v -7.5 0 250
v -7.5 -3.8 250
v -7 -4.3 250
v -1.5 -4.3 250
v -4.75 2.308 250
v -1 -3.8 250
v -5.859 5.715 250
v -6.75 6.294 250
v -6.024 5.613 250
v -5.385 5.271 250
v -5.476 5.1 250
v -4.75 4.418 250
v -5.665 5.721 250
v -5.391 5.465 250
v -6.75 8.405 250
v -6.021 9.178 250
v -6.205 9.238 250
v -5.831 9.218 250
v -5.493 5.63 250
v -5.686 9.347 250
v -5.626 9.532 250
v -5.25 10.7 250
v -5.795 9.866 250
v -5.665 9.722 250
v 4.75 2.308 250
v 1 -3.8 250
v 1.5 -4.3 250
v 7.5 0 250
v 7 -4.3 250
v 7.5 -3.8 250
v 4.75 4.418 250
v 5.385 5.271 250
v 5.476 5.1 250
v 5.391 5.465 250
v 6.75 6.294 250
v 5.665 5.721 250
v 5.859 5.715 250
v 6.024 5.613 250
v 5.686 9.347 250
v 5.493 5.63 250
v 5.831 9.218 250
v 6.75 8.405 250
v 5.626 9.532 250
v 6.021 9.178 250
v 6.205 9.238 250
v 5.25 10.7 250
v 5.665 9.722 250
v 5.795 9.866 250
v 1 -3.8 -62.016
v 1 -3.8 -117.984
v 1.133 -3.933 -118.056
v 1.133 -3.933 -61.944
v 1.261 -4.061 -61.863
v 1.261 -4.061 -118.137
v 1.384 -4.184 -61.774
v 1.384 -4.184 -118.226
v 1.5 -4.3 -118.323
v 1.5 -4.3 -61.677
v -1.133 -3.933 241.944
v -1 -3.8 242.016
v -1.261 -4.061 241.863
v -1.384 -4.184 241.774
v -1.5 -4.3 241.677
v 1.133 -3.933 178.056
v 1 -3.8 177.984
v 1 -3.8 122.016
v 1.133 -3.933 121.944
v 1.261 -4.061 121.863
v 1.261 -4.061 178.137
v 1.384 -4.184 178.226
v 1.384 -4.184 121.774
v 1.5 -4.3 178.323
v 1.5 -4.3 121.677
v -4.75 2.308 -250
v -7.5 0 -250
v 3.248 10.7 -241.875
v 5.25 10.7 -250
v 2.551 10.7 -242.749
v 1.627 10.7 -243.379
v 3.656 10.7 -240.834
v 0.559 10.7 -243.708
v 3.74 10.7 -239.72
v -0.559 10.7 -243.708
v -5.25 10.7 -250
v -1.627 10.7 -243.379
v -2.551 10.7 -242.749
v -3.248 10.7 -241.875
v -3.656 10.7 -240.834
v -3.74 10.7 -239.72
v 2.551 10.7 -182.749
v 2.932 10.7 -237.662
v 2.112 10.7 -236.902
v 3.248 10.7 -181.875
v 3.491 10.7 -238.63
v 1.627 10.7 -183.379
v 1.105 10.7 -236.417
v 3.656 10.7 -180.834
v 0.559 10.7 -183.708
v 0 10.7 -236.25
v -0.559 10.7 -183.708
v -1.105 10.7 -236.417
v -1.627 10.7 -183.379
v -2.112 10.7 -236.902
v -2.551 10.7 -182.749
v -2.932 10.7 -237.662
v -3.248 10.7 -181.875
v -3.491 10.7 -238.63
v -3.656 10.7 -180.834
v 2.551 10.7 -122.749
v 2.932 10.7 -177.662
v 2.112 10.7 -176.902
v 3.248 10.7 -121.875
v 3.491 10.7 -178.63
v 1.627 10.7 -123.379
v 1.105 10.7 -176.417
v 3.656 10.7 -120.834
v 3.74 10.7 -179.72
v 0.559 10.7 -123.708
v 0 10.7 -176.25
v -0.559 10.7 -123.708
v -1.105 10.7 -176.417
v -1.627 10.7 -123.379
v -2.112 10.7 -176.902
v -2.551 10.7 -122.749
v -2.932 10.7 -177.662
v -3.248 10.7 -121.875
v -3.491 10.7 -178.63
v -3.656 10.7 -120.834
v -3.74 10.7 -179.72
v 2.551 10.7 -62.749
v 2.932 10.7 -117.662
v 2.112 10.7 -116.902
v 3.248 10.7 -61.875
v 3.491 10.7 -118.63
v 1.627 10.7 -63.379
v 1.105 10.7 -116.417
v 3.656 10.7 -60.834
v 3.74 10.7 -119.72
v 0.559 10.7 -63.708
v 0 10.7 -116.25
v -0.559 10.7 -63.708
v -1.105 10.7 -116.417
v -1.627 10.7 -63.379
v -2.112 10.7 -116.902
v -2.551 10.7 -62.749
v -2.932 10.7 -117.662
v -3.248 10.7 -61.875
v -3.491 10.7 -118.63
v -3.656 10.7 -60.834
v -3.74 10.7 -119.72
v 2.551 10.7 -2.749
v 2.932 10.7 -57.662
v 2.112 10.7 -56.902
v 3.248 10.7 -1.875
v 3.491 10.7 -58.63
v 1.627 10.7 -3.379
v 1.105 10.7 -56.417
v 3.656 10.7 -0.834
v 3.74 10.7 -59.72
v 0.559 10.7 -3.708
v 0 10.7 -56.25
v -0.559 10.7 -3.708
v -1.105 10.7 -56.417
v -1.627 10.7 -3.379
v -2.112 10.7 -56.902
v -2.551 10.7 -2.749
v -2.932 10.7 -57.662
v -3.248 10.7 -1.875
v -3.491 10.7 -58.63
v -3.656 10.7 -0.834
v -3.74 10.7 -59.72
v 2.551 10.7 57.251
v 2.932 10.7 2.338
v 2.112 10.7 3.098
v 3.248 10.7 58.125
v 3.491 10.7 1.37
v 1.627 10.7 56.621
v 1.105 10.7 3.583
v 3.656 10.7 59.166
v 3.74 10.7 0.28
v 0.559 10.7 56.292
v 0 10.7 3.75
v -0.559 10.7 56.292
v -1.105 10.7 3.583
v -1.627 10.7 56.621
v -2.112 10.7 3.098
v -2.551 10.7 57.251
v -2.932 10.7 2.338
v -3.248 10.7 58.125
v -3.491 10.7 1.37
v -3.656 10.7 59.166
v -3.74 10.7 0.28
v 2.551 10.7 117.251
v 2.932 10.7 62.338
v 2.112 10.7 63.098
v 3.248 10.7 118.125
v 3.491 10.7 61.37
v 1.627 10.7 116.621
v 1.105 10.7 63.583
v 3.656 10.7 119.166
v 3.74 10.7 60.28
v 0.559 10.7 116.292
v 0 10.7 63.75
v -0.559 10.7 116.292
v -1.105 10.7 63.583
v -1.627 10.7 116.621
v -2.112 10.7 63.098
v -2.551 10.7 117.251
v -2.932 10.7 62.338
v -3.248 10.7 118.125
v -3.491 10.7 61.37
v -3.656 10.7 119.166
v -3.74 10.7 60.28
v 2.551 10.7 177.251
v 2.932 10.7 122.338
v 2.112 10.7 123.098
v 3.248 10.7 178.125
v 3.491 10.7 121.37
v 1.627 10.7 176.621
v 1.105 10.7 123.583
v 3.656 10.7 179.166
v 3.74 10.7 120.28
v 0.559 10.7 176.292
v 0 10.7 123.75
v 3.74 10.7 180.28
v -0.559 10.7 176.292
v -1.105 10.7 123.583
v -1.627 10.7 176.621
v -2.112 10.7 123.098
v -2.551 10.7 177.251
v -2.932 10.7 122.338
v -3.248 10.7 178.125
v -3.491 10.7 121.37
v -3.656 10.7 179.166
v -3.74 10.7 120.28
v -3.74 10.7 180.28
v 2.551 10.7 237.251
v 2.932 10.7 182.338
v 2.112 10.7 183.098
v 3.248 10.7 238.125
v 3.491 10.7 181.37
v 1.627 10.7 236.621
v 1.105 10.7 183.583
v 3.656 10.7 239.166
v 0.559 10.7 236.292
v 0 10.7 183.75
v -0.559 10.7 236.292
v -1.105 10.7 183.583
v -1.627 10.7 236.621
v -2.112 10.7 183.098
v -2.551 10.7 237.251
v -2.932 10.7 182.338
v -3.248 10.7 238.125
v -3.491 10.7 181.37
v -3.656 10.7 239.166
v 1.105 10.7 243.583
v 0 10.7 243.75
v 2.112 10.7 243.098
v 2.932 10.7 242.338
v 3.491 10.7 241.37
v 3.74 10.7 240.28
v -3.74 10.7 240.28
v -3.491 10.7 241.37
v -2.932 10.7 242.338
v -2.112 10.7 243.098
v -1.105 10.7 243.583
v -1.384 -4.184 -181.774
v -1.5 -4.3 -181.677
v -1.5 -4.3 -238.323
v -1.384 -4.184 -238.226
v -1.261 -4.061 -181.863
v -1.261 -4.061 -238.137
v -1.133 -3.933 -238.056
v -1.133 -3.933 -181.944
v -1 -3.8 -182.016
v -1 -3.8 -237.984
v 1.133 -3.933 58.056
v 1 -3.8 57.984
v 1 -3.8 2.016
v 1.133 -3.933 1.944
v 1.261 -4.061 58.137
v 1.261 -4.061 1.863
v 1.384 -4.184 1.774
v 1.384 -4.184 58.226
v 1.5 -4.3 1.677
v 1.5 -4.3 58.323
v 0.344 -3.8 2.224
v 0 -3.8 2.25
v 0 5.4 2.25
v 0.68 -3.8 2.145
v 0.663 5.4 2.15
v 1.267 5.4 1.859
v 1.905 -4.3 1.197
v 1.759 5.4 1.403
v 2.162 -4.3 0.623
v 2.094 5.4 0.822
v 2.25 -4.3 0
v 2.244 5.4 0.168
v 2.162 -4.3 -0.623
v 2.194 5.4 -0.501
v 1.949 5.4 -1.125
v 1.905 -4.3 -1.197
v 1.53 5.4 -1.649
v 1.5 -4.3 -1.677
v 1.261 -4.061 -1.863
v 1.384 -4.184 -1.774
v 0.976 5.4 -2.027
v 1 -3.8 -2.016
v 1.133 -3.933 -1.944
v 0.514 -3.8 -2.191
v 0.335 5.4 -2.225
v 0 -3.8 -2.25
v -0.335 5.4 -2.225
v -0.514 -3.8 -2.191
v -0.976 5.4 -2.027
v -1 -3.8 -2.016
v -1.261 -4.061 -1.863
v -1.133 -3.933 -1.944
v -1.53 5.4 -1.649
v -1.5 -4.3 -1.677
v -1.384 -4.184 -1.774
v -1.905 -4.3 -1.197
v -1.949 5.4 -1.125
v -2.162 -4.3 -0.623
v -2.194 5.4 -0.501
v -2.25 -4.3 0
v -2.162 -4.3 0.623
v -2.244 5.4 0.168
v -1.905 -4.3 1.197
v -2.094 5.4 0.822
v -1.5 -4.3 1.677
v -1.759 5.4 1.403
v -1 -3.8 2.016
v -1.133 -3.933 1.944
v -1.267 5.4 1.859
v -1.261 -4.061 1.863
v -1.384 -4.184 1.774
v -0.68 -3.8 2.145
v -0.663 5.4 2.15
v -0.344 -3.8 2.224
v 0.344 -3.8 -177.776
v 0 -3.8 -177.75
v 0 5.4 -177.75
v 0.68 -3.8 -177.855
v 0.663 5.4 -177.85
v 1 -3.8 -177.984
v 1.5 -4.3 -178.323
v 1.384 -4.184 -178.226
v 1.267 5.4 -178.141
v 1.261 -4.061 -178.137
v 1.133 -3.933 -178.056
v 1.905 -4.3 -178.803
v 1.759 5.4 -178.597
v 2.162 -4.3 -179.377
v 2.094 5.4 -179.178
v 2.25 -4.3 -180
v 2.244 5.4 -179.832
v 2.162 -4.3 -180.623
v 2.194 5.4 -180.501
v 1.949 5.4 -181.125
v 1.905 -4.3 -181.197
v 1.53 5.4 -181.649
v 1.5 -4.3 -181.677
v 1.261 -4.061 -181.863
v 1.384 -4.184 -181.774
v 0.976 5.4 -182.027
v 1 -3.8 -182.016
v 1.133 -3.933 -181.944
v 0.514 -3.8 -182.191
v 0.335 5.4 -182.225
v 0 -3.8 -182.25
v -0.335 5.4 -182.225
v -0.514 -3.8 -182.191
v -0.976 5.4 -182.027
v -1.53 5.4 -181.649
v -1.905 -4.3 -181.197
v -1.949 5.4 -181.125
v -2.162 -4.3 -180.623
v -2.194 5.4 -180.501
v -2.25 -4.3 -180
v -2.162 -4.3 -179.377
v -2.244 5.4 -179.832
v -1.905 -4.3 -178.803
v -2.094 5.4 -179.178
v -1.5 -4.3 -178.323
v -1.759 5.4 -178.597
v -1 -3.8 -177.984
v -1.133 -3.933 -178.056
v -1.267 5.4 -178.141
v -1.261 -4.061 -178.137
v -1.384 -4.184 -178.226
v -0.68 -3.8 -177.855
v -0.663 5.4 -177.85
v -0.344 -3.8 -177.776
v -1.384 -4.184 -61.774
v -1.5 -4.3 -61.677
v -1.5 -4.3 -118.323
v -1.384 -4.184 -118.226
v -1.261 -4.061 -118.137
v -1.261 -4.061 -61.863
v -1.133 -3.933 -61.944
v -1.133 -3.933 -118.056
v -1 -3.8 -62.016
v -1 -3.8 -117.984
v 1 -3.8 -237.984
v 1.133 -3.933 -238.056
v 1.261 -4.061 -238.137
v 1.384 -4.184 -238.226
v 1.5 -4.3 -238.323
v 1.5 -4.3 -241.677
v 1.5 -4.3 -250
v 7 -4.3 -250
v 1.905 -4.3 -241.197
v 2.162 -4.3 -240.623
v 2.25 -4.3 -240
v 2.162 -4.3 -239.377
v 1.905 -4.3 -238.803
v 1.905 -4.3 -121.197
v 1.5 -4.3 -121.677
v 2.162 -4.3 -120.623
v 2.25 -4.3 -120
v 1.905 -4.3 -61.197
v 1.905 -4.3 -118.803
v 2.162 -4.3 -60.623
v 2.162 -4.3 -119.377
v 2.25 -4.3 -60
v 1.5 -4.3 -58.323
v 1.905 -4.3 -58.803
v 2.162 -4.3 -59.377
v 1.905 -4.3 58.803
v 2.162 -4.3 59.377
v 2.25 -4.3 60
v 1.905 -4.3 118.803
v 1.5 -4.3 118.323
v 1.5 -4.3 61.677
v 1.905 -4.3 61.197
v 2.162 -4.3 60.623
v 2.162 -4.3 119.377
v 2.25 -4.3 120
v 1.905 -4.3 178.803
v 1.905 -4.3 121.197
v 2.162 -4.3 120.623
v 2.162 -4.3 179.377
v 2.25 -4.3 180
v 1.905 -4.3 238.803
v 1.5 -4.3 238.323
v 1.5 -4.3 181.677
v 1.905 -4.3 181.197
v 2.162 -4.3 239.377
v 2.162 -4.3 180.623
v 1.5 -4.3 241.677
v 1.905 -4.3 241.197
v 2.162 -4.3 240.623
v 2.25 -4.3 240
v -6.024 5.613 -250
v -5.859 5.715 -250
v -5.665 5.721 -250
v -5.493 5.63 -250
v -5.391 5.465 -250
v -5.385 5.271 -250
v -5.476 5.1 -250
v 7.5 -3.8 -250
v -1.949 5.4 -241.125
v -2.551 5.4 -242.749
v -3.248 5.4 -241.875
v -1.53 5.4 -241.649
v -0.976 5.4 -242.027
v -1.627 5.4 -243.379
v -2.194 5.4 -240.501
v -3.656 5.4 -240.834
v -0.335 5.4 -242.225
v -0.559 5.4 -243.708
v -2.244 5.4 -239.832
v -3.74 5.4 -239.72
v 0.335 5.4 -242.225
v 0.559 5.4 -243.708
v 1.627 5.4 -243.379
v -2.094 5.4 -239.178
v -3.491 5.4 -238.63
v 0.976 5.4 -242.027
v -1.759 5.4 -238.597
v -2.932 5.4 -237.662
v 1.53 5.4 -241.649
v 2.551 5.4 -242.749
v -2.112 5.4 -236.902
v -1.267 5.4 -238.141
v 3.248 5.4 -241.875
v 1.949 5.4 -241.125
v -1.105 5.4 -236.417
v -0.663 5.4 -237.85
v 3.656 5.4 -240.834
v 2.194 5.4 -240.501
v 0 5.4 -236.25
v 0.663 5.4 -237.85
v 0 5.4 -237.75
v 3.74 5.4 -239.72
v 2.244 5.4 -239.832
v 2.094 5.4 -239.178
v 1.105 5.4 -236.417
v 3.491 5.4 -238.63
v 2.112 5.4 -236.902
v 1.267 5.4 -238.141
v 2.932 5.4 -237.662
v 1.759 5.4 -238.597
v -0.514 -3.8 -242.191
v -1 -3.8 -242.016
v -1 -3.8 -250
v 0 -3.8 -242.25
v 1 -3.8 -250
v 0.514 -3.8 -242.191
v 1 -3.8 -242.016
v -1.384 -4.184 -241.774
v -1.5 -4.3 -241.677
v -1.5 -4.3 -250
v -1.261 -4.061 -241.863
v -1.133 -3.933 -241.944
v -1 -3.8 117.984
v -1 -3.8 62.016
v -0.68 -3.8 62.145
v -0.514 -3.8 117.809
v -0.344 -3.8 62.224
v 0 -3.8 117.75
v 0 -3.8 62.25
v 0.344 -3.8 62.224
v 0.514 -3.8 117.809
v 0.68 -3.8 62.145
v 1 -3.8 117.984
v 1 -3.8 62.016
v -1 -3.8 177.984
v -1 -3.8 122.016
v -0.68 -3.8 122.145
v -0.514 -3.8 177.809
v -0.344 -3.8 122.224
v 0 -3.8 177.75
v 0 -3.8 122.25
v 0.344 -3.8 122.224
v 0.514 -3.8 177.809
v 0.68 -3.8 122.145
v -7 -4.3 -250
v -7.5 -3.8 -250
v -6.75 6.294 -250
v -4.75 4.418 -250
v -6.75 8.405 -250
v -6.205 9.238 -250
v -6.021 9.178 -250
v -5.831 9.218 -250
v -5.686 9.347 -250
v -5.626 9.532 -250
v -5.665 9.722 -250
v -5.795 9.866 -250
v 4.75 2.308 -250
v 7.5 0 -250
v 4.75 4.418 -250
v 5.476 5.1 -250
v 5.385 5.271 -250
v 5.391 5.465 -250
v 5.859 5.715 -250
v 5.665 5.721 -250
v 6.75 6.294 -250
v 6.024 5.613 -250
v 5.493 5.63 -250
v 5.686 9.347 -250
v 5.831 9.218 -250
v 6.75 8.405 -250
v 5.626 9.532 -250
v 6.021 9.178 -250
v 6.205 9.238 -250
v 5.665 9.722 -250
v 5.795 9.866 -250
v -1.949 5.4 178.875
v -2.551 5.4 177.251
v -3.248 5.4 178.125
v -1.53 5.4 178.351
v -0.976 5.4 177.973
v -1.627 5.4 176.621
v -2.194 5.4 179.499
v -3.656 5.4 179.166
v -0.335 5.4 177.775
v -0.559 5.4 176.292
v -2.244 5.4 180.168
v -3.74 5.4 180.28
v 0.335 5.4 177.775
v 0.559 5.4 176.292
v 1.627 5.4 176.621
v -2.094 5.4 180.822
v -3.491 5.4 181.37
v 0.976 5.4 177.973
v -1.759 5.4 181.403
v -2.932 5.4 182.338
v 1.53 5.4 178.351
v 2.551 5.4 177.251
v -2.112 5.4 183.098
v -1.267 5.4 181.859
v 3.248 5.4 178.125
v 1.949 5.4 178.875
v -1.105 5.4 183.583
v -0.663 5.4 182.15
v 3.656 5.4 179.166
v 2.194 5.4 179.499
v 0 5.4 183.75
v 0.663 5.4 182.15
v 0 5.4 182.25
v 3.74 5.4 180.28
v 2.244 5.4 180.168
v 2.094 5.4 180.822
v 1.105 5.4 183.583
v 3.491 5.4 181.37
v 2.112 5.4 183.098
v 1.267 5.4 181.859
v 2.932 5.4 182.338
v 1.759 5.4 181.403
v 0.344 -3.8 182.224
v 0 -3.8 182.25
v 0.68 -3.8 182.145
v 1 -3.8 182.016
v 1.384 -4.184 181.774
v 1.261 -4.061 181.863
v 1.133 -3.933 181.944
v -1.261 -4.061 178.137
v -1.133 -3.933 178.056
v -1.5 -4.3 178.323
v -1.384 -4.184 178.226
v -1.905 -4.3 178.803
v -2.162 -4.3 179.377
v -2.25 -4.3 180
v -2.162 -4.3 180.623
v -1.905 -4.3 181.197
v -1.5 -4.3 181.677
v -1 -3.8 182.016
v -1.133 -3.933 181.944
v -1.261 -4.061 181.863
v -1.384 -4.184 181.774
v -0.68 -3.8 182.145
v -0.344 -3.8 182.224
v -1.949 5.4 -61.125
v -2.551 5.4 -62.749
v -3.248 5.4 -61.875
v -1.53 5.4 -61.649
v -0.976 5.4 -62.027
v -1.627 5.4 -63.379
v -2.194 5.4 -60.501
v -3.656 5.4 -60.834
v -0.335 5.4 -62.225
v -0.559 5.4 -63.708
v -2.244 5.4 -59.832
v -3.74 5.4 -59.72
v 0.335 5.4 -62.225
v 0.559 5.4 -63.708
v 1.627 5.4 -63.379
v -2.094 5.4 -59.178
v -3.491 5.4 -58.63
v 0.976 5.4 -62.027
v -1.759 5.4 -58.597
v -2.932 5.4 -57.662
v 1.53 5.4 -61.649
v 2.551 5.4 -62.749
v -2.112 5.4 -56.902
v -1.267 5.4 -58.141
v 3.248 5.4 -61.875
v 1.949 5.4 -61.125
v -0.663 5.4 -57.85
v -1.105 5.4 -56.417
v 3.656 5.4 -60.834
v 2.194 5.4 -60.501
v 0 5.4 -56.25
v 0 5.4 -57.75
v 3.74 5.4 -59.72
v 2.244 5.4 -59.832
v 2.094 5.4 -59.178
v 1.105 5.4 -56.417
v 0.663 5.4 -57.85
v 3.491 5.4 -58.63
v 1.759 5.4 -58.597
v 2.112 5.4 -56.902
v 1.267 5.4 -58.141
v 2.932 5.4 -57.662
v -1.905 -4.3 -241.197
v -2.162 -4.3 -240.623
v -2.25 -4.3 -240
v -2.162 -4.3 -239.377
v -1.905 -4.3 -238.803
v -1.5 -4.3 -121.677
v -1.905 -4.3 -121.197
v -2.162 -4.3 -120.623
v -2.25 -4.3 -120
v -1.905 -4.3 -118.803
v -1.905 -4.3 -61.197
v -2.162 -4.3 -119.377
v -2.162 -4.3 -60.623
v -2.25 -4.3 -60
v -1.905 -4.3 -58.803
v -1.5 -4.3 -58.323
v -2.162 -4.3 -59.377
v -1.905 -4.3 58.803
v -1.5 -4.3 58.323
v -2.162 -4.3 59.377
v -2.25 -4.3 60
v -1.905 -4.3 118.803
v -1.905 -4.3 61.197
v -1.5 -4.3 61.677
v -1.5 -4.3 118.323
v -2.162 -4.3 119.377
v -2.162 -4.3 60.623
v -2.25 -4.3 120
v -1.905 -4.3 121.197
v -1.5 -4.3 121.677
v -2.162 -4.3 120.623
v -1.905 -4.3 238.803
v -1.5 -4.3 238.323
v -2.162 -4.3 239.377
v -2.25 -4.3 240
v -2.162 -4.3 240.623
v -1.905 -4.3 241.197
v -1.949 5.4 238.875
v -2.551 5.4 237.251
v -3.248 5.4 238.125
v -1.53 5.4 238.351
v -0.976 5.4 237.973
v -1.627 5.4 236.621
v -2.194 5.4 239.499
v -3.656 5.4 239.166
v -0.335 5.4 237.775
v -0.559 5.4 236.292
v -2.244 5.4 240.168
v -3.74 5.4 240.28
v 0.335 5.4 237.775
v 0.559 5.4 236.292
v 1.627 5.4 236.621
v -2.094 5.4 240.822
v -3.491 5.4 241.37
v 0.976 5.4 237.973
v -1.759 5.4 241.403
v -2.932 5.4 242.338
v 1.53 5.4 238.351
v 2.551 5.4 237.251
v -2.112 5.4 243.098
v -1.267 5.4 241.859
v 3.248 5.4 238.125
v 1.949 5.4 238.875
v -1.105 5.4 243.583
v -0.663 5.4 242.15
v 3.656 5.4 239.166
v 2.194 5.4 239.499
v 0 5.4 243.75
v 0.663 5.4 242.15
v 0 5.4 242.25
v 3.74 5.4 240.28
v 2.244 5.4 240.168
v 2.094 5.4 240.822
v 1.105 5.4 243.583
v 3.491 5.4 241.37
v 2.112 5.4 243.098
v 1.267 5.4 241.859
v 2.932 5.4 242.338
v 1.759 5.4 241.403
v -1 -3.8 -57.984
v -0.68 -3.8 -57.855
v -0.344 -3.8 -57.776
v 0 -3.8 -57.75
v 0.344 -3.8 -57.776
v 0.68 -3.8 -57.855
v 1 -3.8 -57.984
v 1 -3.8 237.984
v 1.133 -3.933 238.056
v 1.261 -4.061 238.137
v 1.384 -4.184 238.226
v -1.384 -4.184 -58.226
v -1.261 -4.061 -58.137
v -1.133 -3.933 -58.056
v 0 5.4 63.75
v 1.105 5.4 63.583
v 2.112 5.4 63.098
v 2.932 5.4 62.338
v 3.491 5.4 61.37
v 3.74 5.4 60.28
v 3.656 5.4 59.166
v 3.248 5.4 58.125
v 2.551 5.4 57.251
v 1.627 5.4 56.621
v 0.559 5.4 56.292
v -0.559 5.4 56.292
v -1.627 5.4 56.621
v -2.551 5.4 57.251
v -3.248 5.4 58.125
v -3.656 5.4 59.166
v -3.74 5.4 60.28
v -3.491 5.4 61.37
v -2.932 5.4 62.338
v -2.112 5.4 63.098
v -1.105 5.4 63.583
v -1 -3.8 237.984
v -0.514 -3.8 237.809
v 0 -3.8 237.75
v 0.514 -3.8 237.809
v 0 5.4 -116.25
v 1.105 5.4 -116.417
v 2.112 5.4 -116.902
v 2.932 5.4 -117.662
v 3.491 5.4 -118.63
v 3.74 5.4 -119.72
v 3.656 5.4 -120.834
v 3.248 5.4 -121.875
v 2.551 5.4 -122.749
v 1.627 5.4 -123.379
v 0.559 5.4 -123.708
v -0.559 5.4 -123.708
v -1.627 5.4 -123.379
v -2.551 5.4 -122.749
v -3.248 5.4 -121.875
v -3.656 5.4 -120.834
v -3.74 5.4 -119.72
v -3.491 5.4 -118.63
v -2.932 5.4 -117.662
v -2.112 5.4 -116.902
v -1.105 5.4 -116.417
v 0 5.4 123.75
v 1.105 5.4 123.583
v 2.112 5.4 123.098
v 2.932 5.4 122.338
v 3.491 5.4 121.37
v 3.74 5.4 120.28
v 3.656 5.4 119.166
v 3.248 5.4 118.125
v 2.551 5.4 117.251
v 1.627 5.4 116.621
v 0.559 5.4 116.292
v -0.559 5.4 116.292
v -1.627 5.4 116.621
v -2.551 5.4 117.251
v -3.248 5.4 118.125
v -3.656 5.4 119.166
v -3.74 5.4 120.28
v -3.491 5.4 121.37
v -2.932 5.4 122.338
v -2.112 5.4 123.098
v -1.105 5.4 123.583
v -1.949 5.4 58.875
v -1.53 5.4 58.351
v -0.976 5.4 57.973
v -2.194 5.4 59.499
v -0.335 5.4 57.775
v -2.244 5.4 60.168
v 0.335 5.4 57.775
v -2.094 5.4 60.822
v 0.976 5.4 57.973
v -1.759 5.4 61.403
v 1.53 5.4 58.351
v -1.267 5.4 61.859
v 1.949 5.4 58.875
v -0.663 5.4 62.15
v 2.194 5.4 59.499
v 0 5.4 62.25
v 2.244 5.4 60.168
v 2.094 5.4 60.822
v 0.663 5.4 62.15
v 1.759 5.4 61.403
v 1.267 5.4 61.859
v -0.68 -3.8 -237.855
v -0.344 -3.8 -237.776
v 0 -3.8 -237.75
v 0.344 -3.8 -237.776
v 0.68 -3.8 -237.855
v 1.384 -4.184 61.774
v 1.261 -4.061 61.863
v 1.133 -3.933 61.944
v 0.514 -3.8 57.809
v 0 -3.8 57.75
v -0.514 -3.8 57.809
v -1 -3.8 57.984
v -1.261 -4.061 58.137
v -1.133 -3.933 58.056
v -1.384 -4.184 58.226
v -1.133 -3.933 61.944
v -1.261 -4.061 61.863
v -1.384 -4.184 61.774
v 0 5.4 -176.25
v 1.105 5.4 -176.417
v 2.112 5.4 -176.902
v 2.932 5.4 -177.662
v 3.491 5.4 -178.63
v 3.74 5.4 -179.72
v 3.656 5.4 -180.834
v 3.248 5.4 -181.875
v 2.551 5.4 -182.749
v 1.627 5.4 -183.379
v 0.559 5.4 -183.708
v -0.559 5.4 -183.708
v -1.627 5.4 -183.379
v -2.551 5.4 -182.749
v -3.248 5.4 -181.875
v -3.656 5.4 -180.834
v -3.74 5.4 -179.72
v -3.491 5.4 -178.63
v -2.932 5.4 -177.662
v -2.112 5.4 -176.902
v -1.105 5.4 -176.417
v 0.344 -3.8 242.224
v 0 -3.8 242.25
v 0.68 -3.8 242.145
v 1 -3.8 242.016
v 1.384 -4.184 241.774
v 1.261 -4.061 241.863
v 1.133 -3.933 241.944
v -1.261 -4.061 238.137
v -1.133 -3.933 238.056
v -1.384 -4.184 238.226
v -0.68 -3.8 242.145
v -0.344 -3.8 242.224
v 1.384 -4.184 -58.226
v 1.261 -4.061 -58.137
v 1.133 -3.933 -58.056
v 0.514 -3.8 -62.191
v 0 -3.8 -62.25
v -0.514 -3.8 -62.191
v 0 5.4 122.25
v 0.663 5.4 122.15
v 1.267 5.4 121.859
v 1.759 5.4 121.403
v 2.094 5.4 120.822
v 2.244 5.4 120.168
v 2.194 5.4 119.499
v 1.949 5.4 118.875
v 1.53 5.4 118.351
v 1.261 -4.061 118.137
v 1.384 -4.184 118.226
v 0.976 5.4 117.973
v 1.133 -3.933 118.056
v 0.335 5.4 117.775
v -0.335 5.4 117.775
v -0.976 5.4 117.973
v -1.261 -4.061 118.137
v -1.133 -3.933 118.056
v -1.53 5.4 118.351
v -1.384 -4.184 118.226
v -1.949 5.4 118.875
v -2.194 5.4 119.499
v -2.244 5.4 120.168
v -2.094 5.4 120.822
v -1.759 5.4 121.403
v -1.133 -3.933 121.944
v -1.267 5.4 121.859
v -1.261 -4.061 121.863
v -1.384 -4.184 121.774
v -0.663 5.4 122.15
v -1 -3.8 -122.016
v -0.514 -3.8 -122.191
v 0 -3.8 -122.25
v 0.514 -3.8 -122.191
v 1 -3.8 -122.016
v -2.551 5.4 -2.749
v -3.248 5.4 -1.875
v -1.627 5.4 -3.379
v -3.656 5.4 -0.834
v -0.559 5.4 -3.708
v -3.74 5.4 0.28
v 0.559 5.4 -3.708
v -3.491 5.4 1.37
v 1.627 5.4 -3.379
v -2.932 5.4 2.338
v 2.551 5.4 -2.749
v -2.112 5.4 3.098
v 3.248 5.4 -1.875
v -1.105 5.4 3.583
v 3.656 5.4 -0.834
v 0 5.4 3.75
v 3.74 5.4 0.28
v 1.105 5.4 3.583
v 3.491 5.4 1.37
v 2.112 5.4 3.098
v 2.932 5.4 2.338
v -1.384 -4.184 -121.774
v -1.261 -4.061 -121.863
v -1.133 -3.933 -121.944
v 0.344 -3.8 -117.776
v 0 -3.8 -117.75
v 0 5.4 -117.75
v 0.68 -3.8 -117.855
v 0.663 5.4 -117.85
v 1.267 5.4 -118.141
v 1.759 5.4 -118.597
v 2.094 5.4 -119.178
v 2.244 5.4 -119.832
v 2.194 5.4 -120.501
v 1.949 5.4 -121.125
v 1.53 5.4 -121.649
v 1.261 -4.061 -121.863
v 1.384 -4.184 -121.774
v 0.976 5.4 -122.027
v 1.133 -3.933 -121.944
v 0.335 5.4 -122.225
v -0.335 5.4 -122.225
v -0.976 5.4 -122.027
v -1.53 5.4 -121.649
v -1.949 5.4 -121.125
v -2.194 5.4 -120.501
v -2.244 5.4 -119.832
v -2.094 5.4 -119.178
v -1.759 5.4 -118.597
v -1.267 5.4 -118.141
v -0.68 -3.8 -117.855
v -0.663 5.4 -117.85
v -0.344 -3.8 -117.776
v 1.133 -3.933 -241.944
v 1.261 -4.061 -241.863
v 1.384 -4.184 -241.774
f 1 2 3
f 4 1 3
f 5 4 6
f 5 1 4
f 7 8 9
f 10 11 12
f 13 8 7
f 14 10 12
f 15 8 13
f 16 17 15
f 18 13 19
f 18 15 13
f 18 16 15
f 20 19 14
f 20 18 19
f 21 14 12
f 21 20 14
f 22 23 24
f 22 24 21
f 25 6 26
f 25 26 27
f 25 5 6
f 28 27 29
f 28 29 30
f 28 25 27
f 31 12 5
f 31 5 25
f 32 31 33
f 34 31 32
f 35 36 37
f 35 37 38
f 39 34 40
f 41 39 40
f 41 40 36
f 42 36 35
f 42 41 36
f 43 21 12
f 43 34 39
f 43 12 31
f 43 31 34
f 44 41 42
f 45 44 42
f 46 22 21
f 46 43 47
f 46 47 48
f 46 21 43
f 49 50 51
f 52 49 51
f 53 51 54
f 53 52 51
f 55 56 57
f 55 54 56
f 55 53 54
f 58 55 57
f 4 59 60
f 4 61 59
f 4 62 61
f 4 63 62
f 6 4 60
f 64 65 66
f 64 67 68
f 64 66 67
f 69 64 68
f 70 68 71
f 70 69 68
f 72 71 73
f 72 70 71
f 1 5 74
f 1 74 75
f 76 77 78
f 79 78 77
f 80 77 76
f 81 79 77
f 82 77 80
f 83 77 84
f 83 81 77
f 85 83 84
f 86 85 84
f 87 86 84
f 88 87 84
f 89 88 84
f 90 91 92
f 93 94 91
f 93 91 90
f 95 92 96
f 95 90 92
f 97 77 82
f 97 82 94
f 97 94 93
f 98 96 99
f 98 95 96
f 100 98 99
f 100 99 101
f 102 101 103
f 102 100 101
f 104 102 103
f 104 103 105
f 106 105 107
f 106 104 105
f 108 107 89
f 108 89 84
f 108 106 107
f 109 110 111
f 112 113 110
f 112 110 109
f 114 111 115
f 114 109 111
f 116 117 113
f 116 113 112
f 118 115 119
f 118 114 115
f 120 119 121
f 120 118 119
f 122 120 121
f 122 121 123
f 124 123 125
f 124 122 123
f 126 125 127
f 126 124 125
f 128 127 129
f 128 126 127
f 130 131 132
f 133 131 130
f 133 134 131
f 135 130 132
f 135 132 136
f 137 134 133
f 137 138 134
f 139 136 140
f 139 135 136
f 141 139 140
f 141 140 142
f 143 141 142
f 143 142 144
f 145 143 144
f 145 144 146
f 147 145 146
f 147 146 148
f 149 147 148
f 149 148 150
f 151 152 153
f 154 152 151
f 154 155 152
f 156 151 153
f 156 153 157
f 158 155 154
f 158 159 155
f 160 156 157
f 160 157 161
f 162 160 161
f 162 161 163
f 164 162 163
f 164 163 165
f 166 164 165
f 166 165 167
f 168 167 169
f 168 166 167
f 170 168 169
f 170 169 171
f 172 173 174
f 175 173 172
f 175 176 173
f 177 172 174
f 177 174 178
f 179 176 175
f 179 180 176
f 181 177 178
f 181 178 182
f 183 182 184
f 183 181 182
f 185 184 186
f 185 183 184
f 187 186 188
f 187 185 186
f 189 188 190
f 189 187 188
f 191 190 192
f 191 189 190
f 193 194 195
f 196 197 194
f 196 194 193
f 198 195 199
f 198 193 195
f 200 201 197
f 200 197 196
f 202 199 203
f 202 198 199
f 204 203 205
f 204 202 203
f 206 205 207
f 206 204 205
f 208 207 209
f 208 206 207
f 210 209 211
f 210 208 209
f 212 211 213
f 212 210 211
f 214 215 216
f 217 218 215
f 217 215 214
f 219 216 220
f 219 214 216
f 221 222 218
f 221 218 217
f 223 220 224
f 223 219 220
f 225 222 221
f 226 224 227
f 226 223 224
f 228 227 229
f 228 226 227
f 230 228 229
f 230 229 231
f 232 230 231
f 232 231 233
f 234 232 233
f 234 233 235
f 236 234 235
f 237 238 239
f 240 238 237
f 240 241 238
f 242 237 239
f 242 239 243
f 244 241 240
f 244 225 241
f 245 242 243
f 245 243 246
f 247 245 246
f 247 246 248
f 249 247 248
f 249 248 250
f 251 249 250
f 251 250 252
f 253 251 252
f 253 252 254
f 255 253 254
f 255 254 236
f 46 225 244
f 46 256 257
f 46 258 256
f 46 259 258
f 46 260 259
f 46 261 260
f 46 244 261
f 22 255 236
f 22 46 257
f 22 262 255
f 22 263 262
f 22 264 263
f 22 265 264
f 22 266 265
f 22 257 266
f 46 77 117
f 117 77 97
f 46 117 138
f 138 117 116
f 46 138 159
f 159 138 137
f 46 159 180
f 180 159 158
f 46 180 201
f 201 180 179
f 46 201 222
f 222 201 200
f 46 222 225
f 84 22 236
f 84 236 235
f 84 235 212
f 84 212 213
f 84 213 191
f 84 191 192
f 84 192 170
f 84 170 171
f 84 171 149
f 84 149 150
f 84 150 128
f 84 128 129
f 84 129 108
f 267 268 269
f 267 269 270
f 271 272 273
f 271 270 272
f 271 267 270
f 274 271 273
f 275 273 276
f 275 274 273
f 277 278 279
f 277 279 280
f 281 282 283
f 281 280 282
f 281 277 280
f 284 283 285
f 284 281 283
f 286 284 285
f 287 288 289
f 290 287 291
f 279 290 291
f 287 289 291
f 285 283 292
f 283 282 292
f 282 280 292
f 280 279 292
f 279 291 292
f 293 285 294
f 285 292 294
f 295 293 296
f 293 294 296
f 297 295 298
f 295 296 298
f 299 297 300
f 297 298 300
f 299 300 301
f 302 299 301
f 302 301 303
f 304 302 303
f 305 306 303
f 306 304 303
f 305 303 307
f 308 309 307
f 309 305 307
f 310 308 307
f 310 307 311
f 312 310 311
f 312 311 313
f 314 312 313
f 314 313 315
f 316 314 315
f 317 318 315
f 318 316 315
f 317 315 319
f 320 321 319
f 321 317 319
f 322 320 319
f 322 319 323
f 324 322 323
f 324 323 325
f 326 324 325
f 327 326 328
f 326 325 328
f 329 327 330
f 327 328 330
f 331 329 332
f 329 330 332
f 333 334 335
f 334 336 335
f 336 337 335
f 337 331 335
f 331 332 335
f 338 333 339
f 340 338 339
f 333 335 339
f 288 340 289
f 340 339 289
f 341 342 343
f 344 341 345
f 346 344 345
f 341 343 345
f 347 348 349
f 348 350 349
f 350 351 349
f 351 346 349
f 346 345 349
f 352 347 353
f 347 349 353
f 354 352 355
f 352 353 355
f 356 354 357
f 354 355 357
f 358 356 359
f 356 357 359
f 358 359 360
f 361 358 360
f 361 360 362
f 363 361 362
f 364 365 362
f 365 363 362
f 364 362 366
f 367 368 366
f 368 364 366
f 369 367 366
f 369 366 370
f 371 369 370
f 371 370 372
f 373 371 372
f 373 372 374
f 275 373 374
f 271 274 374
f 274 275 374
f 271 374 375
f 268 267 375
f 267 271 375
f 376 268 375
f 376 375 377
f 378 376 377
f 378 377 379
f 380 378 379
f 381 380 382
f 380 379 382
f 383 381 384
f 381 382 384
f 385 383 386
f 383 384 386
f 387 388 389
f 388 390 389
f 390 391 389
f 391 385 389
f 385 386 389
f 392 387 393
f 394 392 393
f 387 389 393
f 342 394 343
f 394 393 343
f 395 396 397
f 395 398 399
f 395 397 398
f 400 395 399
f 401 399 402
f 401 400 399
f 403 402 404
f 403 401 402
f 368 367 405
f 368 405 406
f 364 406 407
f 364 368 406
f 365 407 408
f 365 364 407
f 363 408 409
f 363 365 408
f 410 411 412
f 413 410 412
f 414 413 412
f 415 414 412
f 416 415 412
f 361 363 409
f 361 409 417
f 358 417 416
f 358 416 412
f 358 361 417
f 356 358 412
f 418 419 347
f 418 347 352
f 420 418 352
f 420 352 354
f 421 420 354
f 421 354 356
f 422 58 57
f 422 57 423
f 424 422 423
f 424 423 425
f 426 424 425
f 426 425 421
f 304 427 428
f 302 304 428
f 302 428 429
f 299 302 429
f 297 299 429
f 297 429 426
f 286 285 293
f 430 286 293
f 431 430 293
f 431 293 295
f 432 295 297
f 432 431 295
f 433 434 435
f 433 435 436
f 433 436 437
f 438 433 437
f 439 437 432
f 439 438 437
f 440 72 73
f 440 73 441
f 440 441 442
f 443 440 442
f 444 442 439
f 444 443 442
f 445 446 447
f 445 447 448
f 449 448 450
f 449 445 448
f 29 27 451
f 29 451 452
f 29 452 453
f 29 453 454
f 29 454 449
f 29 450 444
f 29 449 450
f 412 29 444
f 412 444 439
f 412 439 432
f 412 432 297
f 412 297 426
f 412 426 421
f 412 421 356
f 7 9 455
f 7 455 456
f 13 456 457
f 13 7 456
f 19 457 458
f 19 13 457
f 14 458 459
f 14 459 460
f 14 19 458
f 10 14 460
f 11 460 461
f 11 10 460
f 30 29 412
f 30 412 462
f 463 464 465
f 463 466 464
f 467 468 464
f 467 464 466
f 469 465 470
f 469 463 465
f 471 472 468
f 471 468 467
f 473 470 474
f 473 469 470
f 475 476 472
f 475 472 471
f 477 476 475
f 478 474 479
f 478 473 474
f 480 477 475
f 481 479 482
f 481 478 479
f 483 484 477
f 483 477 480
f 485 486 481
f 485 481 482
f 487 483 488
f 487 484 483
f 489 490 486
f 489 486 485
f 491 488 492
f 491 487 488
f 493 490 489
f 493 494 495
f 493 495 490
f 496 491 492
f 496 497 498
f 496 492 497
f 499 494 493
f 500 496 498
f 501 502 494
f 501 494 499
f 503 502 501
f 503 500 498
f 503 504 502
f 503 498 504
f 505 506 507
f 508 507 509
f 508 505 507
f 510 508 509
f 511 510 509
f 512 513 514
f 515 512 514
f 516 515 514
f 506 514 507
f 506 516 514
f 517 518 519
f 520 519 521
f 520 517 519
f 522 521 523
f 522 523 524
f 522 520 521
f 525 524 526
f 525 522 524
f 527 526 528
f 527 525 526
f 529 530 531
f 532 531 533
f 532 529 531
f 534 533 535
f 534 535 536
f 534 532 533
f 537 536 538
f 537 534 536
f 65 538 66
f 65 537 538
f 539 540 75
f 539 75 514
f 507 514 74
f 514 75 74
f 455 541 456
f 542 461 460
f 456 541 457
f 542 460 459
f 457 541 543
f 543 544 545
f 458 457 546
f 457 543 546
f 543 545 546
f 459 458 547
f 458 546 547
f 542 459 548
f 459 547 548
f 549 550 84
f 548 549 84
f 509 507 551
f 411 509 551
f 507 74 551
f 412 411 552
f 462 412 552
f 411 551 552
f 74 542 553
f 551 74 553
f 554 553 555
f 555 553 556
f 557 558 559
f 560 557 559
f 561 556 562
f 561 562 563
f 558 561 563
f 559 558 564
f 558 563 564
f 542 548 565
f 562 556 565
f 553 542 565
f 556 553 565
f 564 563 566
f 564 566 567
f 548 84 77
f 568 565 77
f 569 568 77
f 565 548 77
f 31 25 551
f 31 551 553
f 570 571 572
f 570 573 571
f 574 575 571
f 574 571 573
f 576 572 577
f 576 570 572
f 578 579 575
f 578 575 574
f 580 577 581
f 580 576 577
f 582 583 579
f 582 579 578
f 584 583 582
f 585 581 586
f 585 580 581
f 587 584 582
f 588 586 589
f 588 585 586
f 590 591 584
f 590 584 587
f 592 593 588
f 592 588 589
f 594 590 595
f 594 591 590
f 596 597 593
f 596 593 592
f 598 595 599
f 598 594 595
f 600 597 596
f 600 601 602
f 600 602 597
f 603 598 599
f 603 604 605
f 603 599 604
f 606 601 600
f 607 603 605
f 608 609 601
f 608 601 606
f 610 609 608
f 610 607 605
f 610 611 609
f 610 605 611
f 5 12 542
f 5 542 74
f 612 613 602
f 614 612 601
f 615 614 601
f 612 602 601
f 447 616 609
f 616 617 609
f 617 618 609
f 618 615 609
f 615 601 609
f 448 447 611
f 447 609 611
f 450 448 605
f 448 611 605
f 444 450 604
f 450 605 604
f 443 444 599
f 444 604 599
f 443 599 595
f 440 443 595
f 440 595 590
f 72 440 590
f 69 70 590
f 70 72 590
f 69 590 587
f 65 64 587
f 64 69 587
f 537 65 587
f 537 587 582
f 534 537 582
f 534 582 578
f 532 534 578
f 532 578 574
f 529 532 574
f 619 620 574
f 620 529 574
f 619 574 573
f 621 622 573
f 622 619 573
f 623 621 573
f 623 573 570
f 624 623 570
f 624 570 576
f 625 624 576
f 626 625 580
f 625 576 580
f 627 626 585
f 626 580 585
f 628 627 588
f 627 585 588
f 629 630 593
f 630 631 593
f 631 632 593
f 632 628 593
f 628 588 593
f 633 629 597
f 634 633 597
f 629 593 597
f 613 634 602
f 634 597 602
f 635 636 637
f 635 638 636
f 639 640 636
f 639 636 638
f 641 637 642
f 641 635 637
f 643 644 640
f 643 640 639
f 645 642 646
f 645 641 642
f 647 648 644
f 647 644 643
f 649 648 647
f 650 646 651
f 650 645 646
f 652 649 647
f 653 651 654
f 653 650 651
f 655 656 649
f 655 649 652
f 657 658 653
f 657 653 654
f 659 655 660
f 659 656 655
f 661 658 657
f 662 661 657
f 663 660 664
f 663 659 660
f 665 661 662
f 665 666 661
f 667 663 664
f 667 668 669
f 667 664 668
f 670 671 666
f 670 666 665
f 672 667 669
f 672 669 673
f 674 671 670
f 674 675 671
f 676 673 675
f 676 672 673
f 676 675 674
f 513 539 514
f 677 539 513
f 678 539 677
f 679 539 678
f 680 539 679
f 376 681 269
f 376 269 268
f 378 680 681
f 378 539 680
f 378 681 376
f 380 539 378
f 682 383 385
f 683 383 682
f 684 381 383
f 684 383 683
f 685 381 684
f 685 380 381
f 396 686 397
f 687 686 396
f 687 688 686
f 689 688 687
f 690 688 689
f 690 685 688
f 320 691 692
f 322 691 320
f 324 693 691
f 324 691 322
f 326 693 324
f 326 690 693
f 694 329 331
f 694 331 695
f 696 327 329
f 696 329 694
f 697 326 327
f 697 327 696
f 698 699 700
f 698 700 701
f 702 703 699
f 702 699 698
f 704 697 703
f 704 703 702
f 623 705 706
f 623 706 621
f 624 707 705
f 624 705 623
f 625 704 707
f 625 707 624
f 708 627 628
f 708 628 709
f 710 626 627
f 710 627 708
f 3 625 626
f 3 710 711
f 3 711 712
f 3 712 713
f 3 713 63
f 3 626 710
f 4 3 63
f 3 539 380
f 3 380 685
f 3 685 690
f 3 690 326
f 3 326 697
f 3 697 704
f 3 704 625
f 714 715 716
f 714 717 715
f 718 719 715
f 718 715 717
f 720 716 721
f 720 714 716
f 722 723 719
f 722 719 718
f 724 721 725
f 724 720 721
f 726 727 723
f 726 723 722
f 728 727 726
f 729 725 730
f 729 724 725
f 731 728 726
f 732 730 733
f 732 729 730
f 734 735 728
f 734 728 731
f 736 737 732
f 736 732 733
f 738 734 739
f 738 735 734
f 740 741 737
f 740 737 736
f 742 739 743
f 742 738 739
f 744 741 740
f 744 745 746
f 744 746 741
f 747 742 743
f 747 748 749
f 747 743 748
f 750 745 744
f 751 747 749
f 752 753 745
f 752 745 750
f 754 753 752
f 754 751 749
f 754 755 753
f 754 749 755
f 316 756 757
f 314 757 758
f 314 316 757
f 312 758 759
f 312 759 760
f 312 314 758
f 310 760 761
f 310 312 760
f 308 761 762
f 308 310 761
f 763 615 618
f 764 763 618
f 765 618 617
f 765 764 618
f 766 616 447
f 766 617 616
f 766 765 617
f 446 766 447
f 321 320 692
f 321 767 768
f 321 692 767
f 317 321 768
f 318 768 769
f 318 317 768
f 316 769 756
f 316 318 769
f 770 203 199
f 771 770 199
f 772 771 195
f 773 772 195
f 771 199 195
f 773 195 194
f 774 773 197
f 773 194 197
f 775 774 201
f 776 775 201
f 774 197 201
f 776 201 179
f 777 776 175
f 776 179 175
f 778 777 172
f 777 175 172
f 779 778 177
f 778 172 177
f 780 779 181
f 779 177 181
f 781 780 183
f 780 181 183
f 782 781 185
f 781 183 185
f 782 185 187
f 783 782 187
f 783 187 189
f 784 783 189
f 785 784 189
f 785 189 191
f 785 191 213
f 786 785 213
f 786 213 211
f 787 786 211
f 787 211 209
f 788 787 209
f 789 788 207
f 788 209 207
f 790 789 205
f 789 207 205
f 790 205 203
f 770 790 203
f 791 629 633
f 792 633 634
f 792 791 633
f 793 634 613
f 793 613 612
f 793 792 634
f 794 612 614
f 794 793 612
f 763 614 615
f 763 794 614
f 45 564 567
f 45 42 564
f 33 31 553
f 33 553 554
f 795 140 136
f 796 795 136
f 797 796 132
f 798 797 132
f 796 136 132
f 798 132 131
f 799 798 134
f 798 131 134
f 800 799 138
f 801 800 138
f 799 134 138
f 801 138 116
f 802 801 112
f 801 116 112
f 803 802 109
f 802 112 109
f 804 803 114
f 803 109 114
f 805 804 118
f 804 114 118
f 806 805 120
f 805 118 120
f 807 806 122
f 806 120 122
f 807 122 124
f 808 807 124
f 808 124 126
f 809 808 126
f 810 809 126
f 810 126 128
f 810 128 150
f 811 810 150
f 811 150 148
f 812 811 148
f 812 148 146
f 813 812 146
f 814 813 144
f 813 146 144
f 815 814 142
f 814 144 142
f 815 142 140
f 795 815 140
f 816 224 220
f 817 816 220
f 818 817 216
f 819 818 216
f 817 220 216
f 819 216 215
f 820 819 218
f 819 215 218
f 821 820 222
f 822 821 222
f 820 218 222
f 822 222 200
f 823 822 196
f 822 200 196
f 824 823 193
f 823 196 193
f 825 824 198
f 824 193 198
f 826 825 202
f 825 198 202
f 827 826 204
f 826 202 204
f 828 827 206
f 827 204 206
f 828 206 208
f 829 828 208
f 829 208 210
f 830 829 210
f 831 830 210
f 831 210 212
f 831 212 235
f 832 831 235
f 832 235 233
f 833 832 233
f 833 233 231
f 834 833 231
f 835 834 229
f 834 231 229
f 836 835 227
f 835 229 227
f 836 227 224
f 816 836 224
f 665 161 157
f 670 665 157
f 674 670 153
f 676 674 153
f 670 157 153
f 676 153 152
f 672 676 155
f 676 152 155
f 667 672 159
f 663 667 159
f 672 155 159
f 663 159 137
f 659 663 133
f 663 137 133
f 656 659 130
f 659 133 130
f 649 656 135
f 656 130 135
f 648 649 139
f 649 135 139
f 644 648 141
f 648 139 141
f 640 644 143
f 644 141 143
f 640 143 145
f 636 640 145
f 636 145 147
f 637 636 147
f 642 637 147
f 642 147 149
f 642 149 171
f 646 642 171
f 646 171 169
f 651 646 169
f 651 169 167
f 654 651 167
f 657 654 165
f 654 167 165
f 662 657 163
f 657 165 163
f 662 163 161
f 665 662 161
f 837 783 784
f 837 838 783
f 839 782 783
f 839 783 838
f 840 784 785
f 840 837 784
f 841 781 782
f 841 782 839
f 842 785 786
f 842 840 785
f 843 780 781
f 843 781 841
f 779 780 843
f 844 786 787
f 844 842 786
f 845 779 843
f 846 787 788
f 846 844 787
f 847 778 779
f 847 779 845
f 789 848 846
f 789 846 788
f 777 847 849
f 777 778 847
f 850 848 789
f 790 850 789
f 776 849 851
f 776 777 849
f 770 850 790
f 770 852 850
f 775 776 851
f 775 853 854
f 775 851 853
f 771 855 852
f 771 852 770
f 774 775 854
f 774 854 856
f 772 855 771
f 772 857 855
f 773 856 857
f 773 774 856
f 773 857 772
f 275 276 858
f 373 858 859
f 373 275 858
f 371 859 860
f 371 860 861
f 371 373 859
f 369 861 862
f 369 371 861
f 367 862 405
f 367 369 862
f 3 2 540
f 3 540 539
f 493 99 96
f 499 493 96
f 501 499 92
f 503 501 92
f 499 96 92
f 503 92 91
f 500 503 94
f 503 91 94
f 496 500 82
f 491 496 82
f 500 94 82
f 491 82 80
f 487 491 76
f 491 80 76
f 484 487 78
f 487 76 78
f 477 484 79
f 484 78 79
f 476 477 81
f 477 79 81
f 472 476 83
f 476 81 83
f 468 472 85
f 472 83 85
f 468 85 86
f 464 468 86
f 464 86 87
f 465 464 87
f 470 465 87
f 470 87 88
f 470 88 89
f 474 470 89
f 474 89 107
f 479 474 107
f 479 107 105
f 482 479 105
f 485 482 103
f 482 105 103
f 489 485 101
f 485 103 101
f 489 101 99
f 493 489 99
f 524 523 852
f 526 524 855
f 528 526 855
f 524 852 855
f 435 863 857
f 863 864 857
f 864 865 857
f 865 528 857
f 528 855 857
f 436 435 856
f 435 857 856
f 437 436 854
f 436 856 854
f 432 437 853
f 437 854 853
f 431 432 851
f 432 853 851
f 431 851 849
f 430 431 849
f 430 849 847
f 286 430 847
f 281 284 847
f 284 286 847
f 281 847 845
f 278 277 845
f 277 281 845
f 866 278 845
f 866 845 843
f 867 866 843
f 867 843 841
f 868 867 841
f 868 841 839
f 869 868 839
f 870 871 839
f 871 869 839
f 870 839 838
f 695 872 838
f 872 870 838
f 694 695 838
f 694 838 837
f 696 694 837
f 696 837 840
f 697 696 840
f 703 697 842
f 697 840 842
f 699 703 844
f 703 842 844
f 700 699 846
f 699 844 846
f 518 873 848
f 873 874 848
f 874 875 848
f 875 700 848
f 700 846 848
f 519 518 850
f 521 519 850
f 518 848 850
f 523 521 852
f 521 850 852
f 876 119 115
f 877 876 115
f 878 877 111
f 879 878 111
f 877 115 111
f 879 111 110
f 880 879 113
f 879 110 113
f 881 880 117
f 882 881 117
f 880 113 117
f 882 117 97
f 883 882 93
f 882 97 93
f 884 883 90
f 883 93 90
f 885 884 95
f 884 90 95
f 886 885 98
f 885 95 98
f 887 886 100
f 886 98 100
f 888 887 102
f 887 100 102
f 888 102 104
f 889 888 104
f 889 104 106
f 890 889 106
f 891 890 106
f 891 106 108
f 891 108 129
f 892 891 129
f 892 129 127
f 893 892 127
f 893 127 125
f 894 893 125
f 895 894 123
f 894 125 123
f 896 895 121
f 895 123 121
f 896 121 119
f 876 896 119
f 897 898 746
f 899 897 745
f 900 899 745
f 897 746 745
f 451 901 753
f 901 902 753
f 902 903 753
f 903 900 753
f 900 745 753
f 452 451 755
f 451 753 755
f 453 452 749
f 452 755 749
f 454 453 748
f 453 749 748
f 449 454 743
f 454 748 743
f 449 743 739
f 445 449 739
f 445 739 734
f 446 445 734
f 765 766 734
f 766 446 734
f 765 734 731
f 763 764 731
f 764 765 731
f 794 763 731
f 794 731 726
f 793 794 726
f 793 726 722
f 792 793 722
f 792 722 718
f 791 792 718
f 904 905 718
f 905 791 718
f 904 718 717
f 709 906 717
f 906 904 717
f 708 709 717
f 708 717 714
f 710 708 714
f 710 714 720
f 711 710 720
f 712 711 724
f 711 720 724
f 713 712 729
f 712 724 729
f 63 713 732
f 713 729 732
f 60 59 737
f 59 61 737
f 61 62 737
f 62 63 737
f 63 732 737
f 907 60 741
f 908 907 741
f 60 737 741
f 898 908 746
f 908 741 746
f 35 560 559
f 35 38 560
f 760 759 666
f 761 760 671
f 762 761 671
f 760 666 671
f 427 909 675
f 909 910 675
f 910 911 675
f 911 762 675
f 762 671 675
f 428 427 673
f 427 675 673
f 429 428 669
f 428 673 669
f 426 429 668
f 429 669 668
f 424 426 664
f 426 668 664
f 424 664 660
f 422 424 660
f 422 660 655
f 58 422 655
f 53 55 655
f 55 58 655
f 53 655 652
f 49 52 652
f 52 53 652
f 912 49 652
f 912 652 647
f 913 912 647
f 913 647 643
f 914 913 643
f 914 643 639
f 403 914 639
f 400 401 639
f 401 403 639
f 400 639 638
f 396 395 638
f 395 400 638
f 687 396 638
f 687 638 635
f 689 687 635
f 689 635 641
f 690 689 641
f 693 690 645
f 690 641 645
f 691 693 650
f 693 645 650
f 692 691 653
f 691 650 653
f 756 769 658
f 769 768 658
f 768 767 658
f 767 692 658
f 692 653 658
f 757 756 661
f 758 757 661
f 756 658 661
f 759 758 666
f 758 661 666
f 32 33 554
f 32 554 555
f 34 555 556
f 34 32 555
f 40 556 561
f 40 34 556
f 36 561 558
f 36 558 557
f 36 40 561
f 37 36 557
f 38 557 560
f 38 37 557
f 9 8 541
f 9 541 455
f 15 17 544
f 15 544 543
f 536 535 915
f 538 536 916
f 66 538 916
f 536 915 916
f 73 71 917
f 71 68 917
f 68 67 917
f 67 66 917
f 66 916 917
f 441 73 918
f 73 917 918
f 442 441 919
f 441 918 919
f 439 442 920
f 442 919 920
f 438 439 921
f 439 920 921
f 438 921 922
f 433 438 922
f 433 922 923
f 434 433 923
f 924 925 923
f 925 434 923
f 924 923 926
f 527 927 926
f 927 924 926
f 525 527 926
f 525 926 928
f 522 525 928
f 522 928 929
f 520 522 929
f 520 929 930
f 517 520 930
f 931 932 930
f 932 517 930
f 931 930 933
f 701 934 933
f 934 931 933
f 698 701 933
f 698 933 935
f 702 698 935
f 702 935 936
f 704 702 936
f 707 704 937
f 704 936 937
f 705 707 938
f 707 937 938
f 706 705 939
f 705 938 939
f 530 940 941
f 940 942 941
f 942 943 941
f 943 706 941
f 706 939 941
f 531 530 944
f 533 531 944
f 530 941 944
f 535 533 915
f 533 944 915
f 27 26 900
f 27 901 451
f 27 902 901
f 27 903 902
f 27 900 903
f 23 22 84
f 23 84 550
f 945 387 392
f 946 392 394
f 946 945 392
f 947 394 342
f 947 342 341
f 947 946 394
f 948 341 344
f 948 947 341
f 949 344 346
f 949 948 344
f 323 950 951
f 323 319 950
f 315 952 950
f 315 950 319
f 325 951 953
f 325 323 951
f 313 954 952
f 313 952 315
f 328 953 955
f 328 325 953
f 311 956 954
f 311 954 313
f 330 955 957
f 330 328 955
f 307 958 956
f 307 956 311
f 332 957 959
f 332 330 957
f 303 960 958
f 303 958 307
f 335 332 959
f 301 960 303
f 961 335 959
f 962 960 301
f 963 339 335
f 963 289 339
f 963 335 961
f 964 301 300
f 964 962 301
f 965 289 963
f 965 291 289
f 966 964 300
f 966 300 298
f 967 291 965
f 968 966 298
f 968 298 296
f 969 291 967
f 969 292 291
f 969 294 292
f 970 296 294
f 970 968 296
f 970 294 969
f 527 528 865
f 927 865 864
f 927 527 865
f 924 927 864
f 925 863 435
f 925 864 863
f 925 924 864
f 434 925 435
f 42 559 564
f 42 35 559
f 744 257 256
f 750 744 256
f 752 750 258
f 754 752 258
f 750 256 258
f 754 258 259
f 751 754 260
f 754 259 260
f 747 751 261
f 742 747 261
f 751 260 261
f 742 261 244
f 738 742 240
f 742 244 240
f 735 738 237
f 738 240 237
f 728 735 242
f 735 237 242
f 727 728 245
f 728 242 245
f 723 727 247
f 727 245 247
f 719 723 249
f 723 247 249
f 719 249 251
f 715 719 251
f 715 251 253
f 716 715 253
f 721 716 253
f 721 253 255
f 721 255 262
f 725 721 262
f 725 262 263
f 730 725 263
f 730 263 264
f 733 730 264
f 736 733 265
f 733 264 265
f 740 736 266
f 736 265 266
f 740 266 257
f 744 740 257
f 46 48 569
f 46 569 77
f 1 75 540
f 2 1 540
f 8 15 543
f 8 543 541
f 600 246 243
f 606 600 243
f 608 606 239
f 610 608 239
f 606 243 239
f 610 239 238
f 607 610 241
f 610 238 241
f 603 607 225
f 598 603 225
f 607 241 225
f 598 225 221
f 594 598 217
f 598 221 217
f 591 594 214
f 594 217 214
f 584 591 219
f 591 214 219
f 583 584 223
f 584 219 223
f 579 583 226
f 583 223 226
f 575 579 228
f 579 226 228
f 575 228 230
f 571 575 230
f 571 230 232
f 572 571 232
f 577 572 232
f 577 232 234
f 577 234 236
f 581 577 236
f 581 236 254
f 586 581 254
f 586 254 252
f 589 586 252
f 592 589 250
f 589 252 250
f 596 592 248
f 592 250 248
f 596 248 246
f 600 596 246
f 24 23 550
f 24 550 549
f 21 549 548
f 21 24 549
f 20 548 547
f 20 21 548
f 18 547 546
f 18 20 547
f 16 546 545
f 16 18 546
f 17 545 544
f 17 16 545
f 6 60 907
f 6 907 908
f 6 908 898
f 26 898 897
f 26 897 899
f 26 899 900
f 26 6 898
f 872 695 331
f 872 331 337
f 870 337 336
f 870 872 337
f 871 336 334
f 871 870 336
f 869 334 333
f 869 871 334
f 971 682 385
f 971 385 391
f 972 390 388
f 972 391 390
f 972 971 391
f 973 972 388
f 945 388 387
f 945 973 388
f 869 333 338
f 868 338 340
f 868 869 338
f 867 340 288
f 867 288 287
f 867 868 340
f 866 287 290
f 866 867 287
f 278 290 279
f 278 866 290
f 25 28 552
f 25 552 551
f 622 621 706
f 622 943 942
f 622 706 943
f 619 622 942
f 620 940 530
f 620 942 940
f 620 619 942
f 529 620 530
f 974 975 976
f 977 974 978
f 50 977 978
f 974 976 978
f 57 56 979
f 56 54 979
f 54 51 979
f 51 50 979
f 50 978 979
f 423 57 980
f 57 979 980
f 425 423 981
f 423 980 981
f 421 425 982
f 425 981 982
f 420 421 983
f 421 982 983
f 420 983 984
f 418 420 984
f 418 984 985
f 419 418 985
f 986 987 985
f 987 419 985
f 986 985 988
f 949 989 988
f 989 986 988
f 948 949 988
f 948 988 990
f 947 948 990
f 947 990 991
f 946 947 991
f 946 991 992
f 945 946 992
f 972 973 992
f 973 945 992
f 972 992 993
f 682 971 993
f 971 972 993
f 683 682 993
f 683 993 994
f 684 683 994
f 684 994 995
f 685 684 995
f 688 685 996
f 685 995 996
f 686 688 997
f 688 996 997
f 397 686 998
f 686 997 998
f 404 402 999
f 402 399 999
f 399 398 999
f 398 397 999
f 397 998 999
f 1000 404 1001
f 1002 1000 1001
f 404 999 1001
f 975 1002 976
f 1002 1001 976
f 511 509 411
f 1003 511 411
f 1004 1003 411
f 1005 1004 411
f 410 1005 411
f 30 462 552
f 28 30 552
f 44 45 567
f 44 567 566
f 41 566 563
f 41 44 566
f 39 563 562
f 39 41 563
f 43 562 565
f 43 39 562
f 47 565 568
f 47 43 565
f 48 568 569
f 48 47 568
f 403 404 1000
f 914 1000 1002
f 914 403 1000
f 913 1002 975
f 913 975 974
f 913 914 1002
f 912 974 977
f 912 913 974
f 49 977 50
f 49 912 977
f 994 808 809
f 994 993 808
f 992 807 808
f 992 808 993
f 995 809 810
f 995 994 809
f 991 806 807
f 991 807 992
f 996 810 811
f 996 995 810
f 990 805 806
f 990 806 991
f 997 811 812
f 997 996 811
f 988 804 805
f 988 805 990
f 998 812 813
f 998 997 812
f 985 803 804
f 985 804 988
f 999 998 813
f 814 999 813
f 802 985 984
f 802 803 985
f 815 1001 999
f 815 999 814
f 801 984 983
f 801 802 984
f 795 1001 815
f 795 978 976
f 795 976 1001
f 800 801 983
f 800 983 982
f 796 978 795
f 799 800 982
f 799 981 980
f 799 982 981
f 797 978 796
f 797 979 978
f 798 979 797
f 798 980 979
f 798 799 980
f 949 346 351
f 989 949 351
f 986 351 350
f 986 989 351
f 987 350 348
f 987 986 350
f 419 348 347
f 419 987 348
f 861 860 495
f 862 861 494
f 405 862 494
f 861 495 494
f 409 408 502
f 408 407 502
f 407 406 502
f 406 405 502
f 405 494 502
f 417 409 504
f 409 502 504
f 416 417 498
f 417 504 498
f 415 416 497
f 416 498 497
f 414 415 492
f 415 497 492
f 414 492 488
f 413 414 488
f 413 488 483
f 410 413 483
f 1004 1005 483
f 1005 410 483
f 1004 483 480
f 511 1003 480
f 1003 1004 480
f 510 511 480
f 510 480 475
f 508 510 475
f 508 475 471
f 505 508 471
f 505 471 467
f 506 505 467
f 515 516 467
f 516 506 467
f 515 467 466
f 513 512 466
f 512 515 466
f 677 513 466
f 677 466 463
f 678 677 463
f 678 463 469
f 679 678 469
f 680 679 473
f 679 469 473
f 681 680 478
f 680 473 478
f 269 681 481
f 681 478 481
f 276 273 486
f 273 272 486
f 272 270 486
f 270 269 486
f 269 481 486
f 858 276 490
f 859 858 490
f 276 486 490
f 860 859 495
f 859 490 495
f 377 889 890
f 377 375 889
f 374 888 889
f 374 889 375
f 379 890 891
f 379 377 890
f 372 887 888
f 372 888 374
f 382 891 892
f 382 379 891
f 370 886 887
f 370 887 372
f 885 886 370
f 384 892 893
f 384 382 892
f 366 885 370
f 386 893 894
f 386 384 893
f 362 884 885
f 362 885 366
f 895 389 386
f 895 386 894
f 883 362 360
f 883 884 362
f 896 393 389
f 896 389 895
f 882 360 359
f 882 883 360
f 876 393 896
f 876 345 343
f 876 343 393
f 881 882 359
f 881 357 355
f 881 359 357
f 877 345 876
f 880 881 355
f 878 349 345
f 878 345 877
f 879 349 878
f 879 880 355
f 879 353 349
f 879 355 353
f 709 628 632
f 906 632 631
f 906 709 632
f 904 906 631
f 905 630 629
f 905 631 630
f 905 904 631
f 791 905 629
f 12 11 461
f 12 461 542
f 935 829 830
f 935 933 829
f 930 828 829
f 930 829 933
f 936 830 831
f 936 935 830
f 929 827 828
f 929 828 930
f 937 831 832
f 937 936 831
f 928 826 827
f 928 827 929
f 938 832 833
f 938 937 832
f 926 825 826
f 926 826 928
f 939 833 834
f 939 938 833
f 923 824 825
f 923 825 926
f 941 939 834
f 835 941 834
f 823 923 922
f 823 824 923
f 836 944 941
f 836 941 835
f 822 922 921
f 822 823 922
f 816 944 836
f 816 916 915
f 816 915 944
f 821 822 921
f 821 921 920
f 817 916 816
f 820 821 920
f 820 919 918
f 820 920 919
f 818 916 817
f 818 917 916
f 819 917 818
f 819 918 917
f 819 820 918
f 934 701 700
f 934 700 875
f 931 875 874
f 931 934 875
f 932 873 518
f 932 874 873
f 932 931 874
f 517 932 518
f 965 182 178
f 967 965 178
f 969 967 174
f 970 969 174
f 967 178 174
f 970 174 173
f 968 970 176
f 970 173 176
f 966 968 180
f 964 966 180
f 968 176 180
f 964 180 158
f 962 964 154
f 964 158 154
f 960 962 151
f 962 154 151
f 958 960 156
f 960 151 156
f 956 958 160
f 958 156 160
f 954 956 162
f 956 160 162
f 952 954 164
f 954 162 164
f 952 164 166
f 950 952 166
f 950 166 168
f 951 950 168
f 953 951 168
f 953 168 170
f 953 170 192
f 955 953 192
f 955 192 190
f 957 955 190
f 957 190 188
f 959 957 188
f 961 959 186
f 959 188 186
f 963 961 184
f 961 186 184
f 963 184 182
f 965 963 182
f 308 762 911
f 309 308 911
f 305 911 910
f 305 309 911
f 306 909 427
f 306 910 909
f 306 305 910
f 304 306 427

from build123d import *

# Parameters (mm, degrees)
EXTRUDE_2_DEPTH        = 250
SKETCH_4_R             = 2.25
CUT_EXTRUDE_2_DEPTH    = 251.561868607
SKETCH_5_R             = 3.75
CUT_EXTRUDE_3_DEPTH    = 5.3
PATTERN_LINEAR_1_COUNT = 9
PATTERN_LINEAR_1_PITCH = 60


with BuildPart() as part:
    # 草图1 → 凸台-拉伸2 (new, symmetric)
    with BuildSketch(Plane.XY):
        with BuildLine():
            Line((6.75, 8.404656305), (6.205141704, 9.238414341))
            ThreePointArc((6.205141704, 9.238414341), (5.686086188, 9.347186448), (5.794858296, 9.866241964))
            Line((5.794858296, 9.866241964), (5.25, 10.7))
            Line((5.25, 10.7), (-5.25, 10.7))
            Line((-5.25, 10.7), (-5.794858296, 9.866241964))
            ThreePointArc((-5.794858296, 9.866241964), (-5.686086188, 9.347186448), (-6.205141704, 9.238414341))
            Line((-6.205141704, 9.238414341), (-6.75, 8.404656305))
            Line((-6.75, 8.404656305), (-6.75, 6.293987085))
            Line((-6.75, 6.293987085), (-6.023522272, 5.612625848))
            ThreePointArc((-6.023522272, 5.612625848), (-5.493464298, 5.629612418), (-5.476477728, 5.099554443))
            Line((-5.476477728, 5.099554443), (-4.75, 4.418193206))
            Line((-4.75, 4.418193206), (-4.75, 2.307523986))
            Line((-4.75, 2.307523986), (-7.5, 0))
            Line((-7.5, 0), (-7.5, -3.8))
            Line((-7.5, -3.8), (-7, -4.3))
            Line((-7, -4.3), (-1.5, -4.3))
            Line((-1.5, -4.3), (-1, -3.8))
            Line((-1, -3.8), (1, -3.8))
            Line((1, -3.8), (1.5, -4.3))
            Line((1.5, -4.3), (7, -4.3))
            Line((7, -4.3), (7.5, -3.8))
            Line((7.5, -3.8), (7.5, 0))
            Line((7.5, 0), (4.75, 2.307523986))
            Line((4.75, 2.307523986), (4.75, 4.418193206))
            Line((4.75, 4.418193206), (5.476477728, 5.099554443))
            ThreePointArc((5.476477728, 5.099554443), (5.493464298, 5.629612418), (6.023522272, 5.612625848))
            Line((6.023522272, 5.612625848), (6.75, 6.293987085))
            Line((6.75, 6.293987085), (6.75, 8.404656305))
        make_face()
    extrude(amount=EXTRUDE_2_DEPTH, both=True)

    # 草图4 → 切除-拉伸2 (cut, through all)
    with BuildSketch(Plane(origin=(0, 10.7, 0), x_dir=(1, 0, 0), z_dir=(0, 1, 0))):
        with Locations(Location((0, -240, 0), (0, 0, 270))):
            Circle(SKETCH_4_R)
    cut_extrude_2 = extrude(amount=-CUT_EXTRUDE_2_DEPTH, mode=Mode.SUBTRACT)

    # 草图5 → 切除-拉伸3 (cut)
    with BuildSketch(Plane(origin=(0, 10.7, 0), x_dir=(1, 0, 0), z_dir=(0, 1, 0))):
        with Locations(Location((0, -240, 0), (0, 0, 270))):
            Circle(SKETCH_5_R)
    cut_extrude_3 = extrude(amount=-CUT_EXTRUDE_3_DEPTH, mode=Mode.SUBTRACT)

    # 阵列(线性)1: 切除-拉伸2, 切除-拉伸3 ×9
    with Locations(*[(0, 0, -i * PATTERN_LINEAR_1_PITCH) for i in range(1, PATTERN_LINEAR_1_COUNT)]):
        add(cut_extrude_2, mode=Mode.SUBTRACT)
        add(cut_extrude_3, mode=Mode.SUBTRACT)


solid = part.part
